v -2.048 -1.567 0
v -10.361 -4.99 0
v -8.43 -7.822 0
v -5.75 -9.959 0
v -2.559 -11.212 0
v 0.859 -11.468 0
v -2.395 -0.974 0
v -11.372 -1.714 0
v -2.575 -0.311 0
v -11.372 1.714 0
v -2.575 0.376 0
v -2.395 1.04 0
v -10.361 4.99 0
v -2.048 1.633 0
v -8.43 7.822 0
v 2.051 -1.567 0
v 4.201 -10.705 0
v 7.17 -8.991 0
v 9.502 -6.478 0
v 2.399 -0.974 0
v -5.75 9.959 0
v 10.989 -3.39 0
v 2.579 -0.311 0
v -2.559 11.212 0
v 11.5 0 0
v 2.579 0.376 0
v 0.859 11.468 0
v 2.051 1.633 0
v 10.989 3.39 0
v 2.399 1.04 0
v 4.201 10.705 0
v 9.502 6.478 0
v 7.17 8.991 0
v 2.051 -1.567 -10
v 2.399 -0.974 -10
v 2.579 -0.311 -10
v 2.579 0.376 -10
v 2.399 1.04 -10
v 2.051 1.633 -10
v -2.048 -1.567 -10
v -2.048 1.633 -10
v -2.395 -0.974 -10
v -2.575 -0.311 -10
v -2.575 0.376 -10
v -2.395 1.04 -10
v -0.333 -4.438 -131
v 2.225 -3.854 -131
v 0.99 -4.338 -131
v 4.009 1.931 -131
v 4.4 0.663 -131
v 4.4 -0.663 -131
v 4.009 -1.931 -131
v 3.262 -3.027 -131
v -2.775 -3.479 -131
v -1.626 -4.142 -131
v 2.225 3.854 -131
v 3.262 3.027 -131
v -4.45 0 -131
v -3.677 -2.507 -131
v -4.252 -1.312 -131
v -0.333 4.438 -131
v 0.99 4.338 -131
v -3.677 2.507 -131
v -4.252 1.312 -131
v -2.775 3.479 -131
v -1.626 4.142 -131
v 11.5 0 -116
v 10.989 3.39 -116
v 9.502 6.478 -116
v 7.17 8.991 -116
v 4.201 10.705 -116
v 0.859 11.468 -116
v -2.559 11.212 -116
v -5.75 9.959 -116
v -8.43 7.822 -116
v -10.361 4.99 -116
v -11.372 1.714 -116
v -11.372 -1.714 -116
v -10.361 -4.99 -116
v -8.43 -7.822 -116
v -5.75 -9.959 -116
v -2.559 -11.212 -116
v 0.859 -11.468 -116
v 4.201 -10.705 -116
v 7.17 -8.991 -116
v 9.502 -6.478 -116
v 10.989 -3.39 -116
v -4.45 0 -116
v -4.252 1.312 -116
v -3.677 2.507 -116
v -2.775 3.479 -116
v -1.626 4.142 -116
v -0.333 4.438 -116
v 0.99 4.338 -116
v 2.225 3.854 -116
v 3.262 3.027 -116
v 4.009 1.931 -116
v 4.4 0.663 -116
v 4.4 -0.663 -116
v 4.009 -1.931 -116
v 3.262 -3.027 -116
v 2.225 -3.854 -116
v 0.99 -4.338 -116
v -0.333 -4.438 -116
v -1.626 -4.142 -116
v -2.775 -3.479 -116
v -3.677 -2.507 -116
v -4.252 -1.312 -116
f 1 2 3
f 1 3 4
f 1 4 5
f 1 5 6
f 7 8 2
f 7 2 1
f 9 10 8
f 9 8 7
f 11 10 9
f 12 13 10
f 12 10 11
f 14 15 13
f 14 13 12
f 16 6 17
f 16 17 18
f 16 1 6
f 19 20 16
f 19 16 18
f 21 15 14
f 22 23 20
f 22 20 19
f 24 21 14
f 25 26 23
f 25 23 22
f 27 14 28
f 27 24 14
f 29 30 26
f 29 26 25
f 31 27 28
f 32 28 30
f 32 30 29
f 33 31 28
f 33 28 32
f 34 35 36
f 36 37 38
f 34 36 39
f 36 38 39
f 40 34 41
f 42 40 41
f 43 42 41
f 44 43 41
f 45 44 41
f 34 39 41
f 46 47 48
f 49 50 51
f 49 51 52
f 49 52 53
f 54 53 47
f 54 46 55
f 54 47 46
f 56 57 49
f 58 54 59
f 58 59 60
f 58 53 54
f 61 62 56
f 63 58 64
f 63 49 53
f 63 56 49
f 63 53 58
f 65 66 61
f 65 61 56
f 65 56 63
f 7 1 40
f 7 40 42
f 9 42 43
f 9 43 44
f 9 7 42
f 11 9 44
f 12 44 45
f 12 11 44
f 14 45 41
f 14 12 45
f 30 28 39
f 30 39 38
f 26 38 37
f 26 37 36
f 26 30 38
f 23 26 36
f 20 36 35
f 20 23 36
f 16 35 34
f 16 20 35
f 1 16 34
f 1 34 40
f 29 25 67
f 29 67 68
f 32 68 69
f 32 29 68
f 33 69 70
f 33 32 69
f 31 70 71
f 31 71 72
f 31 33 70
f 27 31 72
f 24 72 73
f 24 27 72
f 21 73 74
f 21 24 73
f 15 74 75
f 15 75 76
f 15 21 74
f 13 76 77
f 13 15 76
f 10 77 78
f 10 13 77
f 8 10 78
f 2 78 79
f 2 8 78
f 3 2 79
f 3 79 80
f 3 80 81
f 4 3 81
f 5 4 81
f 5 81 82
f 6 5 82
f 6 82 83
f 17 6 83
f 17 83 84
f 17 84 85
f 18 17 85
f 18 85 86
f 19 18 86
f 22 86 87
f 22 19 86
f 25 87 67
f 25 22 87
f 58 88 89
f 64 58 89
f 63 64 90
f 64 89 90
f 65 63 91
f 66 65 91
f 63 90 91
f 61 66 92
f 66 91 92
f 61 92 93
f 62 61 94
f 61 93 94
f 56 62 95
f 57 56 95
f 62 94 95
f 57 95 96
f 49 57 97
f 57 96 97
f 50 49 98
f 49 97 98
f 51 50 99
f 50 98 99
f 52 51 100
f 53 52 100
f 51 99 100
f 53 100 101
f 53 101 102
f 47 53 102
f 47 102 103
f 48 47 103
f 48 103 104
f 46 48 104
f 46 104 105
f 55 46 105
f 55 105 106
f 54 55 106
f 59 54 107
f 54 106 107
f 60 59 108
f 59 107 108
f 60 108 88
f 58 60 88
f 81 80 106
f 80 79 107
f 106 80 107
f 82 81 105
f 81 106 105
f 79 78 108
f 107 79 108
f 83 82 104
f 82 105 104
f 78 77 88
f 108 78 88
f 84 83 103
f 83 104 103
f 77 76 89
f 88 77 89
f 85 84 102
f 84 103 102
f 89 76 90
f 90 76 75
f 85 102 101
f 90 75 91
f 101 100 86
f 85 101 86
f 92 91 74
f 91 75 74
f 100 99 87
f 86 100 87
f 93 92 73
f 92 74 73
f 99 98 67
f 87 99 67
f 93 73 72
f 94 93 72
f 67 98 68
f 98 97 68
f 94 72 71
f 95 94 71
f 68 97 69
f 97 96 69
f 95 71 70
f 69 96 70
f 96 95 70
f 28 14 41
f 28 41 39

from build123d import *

# Parameters (mm, degrees)
SKETCH2_R           = 11.5
BOSS_EXTRUDE1_DEPTH = 116
SKETCH3_R           = 4.45
BOSS_EXTRUDE2_DEPTH = 15
CUT_EXTRUDE1_DEPTH  = 10


with BuildPart() as part:
    # Sketch2 → Boss-Extrude1 (new body)
    with BuildSketch(Plane.XY):
        Circle(SKETCH2_R)
    extrude(amount=-BOSS_EXTRUDE1_DEPTH)

    # Sketch3 → Boss-Extrude2 (add)
    with BuildSketch(Plane(origin=(0, 0, -116), x_dir=(-1, 0, 0), z_dir=(0, 0, -1))):
        Circle(SKETCH3_R)
    extrude(amount=BOSS_EXTRUDE2_DEPTH)

    # Sketch1 → Cut-Extrude1 (cut)
    with BuildSketch(Plane.XY):
        with BuildLine():
            Line((2.051104302, -1.567413373), (-2.047676004, -1.567413373))
            ThreePointArc((-2.047676004, -1.567413373), (-2.598285851, 0.032586627), (-2.047676004, 1.632586627))
            Line((-2.047676004, 1.632586627), (2.051104302, 1.632586627))
            ThreePointArc((2.051104302, 1.632586627), (2.601714149, 0.032586627), (2.051104302, -1.567413373))
        make_face()
    extrude(amount=-CUT_EXTRUDE1_DEPTH, mode=Mode.SUBTRACT)


solid = part.part
